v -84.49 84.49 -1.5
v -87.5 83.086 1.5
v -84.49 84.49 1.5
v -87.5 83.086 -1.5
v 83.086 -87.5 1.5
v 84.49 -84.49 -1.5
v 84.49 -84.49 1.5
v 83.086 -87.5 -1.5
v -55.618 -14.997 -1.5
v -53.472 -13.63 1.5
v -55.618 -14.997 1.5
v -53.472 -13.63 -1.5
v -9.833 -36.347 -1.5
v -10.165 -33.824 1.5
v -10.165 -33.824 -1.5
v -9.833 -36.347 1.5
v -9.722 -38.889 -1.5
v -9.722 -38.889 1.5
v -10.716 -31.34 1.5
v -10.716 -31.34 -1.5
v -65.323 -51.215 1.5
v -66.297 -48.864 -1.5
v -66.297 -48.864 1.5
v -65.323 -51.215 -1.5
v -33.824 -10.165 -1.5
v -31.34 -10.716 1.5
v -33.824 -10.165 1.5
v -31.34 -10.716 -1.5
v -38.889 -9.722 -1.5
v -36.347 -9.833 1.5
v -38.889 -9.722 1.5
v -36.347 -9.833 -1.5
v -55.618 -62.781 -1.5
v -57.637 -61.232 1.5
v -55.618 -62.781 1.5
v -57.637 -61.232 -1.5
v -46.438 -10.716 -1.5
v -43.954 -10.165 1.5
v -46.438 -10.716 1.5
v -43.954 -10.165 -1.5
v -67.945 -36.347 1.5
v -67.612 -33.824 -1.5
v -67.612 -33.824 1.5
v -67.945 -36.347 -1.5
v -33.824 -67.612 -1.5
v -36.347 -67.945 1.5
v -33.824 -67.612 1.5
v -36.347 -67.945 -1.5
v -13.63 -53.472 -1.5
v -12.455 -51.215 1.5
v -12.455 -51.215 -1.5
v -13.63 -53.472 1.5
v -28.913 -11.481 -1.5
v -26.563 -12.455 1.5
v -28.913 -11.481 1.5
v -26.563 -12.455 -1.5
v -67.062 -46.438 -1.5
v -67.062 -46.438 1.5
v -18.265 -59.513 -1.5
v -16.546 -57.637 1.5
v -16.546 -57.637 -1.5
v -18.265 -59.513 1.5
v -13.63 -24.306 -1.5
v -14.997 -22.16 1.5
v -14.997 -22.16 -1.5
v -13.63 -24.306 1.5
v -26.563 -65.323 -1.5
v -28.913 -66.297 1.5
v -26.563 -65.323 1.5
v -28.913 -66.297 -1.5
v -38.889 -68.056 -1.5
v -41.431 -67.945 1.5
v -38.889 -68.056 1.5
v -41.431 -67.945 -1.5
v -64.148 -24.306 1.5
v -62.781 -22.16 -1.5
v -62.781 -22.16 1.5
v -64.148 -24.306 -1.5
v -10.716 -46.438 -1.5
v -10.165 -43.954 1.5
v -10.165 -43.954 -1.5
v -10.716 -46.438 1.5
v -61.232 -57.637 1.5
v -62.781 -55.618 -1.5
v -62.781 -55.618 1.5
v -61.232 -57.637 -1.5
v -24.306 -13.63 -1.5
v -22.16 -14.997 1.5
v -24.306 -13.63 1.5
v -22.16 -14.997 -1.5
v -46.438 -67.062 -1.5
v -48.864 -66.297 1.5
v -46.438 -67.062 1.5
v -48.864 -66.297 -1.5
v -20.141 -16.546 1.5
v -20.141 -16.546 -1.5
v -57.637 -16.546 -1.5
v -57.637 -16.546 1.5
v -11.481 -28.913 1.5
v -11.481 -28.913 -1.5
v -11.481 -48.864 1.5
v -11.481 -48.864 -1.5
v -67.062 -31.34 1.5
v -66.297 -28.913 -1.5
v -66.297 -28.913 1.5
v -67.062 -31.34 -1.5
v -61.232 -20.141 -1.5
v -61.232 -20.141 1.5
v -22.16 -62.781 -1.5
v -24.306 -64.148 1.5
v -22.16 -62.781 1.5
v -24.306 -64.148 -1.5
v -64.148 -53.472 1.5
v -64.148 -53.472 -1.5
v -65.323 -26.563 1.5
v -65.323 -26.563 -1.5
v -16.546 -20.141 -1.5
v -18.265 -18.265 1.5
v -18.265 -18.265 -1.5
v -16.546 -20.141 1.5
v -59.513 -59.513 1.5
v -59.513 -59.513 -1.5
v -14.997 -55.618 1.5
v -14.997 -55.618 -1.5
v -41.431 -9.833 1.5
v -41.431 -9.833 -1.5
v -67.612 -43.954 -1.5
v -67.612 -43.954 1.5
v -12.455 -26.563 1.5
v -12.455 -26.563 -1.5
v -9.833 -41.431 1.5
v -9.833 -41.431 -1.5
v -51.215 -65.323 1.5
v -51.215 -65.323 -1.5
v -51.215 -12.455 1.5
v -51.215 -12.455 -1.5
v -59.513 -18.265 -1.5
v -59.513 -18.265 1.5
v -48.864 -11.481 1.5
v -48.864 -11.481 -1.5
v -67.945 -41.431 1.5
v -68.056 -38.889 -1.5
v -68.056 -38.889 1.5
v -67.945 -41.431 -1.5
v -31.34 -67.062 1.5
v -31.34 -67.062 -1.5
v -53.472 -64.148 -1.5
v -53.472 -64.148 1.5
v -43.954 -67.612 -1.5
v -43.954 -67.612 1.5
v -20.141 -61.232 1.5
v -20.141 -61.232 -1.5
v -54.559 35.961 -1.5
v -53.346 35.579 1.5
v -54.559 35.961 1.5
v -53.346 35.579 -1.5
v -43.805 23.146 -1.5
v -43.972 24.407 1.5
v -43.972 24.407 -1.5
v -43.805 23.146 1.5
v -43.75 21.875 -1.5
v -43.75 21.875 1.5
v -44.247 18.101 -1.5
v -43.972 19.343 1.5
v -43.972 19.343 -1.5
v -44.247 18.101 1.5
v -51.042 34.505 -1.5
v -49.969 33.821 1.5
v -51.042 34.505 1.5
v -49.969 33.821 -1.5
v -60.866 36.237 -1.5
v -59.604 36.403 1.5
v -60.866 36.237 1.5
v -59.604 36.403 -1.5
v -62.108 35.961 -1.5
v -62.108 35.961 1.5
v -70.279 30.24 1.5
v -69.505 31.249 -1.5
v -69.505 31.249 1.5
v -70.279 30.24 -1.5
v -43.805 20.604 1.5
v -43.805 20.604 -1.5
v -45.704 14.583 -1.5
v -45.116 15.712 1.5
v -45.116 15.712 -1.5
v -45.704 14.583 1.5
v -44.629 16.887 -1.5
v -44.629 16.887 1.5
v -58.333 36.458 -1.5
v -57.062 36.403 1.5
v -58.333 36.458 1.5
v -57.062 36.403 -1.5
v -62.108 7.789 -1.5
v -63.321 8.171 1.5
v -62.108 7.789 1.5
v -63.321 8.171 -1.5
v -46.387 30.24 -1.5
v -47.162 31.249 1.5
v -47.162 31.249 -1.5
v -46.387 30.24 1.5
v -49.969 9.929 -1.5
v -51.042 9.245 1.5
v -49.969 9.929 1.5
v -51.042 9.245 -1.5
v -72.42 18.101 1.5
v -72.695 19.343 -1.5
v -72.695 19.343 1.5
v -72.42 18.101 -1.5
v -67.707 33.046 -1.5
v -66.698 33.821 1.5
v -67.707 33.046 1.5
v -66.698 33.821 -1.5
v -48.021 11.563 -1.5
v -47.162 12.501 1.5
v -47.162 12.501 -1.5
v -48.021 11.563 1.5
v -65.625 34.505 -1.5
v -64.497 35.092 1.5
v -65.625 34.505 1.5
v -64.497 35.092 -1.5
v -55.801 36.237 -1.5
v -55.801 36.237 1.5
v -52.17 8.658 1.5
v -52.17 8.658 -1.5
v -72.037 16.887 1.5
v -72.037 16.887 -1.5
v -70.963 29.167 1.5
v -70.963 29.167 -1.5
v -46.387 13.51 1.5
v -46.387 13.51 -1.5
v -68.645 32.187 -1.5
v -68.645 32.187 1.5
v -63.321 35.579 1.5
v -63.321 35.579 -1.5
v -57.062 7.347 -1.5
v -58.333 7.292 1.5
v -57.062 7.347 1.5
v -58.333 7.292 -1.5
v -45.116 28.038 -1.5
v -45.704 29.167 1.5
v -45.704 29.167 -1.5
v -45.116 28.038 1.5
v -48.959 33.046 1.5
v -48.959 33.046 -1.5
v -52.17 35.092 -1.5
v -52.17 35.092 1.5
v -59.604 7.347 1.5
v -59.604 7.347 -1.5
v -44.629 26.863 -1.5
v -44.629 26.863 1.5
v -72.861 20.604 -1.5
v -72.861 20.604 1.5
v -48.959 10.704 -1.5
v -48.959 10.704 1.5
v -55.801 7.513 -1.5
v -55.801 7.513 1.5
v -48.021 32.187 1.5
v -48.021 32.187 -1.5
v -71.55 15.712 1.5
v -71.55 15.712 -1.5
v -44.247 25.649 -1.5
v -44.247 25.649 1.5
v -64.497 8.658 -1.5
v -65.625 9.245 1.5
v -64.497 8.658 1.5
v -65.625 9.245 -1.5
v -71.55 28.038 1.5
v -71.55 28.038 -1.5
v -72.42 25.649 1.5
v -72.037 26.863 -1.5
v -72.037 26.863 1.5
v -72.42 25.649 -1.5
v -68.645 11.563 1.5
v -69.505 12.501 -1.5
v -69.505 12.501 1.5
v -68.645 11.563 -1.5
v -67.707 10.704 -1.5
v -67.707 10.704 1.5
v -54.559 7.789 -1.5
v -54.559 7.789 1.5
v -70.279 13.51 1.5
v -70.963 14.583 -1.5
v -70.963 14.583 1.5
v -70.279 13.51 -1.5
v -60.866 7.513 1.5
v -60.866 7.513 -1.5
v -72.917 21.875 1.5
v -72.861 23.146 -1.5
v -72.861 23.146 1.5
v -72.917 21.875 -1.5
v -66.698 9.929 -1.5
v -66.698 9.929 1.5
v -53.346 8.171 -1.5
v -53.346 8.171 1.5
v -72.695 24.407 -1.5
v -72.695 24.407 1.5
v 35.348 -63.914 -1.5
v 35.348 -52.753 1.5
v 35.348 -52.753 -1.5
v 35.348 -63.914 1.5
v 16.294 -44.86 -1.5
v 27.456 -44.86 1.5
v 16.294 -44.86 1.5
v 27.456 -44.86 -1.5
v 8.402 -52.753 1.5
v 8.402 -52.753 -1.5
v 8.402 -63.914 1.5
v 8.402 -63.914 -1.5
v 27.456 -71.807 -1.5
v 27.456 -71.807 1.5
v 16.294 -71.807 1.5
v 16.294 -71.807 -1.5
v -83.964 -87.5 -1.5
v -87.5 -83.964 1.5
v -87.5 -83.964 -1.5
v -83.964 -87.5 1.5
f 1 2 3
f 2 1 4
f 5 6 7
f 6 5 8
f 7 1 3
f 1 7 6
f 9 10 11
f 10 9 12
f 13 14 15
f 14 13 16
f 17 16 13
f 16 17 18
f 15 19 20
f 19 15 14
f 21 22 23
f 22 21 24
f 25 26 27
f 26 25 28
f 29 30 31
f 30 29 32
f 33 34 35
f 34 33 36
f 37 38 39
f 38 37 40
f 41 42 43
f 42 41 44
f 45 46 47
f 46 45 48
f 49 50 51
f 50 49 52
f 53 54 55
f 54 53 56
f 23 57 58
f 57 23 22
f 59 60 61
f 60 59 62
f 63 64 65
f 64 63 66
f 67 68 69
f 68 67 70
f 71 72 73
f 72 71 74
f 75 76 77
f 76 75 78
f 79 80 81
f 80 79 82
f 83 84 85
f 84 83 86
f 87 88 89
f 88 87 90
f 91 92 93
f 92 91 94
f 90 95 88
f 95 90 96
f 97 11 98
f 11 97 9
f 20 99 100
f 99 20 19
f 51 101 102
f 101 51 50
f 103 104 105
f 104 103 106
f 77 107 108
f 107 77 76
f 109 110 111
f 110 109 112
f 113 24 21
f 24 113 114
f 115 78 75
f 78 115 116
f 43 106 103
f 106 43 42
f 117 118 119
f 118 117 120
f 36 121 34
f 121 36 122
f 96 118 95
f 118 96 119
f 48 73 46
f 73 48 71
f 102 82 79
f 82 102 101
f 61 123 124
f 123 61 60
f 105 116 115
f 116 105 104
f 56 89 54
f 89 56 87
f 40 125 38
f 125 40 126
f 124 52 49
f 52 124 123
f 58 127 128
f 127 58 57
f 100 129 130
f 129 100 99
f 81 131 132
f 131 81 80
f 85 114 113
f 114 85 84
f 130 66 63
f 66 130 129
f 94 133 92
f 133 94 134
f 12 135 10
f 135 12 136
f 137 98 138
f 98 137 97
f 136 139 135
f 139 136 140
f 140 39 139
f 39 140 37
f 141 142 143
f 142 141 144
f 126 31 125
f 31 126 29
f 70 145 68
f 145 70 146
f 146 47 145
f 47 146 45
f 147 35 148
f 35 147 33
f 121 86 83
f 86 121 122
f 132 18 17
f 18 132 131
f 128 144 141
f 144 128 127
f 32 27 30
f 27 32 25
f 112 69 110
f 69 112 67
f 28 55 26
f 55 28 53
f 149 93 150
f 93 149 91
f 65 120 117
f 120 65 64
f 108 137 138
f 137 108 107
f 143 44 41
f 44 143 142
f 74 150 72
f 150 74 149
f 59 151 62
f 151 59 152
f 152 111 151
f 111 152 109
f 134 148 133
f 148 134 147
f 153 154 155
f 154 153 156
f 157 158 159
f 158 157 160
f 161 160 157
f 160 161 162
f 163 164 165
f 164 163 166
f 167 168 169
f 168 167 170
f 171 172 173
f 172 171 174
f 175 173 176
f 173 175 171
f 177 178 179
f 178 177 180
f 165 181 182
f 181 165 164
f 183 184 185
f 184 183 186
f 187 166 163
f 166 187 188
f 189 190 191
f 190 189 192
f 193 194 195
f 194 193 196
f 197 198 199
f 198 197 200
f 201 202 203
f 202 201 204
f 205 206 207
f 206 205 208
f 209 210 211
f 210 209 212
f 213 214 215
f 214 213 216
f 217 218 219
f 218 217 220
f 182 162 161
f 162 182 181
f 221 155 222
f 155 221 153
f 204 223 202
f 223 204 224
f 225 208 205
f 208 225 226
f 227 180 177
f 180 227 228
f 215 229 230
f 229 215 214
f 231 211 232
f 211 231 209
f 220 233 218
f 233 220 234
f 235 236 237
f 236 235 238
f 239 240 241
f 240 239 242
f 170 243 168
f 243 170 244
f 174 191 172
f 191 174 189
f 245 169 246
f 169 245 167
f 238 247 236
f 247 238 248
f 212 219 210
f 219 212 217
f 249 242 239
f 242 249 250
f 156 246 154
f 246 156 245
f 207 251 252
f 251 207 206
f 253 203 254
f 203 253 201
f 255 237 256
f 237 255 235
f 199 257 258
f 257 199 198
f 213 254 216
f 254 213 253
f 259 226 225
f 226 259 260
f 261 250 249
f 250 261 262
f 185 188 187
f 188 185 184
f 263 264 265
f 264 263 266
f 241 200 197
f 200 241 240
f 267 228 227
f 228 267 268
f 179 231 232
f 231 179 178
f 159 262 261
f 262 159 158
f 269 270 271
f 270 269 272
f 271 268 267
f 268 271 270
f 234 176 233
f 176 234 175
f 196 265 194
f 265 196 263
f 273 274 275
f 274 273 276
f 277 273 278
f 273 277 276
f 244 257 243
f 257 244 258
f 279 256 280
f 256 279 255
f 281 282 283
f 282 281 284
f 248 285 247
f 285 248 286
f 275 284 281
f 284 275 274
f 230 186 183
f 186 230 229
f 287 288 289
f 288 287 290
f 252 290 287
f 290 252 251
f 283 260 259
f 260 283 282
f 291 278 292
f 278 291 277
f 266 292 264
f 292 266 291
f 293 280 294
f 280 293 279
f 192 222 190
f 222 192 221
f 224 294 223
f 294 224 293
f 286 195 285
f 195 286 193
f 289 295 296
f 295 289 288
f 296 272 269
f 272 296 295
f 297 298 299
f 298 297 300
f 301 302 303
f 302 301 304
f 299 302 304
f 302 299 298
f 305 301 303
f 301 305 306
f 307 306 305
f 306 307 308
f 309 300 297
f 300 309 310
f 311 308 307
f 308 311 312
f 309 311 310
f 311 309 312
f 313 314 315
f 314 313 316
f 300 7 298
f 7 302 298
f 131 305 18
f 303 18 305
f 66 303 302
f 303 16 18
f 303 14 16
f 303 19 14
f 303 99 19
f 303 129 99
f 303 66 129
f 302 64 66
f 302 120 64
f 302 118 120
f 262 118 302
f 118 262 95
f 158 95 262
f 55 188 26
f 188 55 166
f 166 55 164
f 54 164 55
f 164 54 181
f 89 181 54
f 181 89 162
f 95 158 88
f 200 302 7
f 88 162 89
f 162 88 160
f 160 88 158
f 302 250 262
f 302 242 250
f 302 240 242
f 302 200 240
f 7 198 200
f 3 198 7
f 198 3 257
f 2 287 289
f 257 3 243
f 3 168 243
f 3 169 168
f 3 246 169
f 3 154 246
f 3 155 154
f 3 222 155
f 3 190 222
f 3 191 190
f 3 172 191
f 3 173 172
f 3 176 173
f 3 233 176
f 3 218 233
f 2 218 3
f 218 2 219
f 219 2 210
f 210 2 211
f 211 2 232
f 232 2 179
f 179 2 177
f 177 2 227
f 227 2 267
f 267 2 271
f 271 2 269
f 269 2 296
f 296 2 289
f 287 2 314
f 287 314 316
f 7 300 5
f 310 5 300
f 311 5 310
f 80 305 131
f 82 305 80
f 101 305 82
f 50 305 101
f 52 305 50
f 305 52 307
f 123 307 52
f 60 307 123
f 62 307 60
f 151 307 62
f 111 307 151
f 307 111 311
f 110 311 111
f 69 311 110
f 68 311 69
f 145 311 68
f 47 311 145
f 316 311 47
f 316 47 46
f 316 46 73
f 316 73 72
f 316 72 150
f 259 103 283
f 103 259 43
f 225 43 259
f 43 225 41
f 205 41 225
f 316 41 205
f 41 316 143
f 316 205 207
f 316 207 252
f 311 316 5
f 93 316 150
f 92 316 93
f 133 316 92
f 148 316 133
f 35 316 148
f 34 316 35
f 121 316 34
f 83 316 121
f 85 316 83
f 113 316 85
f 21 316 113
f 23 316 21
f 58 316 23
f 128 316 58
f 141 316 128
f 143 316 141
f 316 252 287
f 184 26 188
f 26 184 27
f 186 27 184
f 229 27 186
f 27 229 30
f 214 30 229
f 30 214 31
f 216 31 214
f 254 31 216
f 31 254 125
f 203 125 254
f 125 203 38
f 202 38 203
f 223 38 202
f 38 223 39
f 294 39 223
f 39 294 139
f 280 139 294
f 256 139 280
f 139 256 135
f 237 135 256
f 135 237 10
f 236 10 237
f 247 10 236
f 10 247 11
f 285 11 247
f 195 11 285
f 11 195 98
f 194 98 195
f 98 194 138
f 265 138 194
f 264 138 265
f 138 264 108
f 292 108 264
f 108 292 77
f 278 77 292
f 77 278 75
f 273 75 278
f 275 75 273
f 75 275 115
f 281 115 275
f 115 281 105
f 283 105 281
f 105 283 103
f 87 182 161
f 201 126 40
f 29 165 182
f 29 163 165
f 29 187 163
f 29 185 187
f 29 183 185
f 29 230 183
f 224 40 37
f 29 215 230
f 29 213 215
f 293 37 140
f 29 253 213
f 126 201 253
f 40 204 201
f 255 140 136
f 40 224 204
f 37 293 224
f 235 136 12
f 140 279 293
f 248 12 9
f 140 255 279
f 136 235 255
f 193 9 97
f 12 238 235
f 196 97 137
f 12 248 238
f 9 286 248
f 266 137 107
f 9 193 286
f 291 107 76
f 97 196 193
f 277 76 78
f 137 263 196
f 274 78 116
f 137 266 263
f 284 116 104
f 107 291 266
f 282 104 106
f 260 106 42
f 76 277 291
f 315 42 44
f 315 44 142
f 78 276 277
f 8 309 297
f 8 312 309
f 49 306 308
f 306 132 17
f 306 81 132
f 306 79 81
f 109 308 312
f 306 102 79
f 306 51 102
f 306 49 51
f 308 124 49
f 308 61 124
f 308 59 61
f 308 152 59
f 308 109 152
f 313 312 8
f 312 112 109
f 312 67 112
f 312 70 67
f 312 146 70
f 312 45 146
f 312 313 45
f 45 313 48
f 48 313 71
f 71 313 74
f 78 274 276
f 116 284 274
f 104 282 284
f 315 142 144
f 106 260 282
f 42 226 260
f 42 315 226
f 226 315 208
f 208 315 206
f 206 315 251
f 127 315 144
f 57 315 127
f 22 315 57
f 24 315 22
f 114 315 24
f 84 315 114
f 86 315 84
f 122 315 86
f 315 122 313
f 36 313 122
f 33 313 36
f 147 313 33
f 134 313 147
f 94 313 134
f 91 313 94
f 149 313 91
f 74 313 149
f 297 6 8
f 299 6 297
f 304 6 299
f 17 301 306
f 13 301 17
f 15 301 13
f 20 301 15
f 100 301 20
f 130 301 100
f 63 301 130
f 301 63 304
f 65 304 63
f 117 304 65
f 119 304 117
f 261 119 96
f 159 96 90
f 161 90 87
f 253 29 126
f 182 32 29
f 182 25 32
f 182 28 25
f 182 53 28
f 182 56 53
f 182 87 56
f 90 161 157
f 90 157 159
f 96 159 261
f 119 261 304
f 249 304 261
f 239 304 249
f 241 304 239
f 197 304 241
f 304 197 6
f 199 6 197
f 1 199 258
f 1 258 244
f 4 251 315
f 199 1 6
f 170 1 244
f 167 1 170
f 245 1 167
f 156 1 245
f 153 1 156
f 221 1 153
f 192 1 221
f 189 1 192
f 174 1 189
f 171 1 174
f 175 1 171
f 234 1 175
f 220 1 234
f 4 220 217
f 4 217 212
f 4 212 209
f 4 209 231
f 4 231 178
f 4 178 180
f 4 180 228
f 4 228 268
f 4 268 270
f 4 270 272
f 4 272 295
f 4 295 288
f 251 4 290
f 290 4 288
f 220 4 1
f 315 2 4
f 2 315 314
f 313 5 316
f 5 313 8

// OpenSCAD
side_length=175;
thickness = 3;
diagonal_length = sqrt(2*pow(side_length, 2));

echo("DIAGONAL LENGTH: ", diagonal_length);

x=0;
y=1;
z=2;

module straight_edge() {
  module body() {
    cube([side_length,side_length,thickness],center=true);
  }

  module holes() {
    // diagonal
    translate([side_length/2,side_length/2,0])
      rotate([0,0,45])
        cube([diagonal_length,diagonal_length+10,thickness+1],center=true);

    // large hole
    translate([-side_length/4.5,-side_length/4.5,0])
      cylinder(r=side_length/6,h=thickness+1,center=true,$fn=72);

    // medium hole
    med_hole=[side_length/3,side_length/8,0];
    translate([-med_hole[x],med_hole[y],0])
      cylinder(r=side_length/12,h=thickness+1,center=true,$fn=72);
    translate([med_hole[y],-med_hole[x],0]) rotate([0,0,22.5])
      cylinder(r=side_length/12,h=thickness+1,center=true,$fn=8);

    // less pointy corners
    for (side=[1,-1]) {
      translate([-side_length/2*side,side_length/2*side,0])
        rotate([0,0,25*side])
          cube([8,8,thickness+1],center=true);
    }

    translate([-side_length/2,-side_length/2,0])
      rotate([0,0,45])
        cube([5,5,thickness+1],center=true);
  }

  difference() {
    body();
    holes();
  }
}

straight_edge();
